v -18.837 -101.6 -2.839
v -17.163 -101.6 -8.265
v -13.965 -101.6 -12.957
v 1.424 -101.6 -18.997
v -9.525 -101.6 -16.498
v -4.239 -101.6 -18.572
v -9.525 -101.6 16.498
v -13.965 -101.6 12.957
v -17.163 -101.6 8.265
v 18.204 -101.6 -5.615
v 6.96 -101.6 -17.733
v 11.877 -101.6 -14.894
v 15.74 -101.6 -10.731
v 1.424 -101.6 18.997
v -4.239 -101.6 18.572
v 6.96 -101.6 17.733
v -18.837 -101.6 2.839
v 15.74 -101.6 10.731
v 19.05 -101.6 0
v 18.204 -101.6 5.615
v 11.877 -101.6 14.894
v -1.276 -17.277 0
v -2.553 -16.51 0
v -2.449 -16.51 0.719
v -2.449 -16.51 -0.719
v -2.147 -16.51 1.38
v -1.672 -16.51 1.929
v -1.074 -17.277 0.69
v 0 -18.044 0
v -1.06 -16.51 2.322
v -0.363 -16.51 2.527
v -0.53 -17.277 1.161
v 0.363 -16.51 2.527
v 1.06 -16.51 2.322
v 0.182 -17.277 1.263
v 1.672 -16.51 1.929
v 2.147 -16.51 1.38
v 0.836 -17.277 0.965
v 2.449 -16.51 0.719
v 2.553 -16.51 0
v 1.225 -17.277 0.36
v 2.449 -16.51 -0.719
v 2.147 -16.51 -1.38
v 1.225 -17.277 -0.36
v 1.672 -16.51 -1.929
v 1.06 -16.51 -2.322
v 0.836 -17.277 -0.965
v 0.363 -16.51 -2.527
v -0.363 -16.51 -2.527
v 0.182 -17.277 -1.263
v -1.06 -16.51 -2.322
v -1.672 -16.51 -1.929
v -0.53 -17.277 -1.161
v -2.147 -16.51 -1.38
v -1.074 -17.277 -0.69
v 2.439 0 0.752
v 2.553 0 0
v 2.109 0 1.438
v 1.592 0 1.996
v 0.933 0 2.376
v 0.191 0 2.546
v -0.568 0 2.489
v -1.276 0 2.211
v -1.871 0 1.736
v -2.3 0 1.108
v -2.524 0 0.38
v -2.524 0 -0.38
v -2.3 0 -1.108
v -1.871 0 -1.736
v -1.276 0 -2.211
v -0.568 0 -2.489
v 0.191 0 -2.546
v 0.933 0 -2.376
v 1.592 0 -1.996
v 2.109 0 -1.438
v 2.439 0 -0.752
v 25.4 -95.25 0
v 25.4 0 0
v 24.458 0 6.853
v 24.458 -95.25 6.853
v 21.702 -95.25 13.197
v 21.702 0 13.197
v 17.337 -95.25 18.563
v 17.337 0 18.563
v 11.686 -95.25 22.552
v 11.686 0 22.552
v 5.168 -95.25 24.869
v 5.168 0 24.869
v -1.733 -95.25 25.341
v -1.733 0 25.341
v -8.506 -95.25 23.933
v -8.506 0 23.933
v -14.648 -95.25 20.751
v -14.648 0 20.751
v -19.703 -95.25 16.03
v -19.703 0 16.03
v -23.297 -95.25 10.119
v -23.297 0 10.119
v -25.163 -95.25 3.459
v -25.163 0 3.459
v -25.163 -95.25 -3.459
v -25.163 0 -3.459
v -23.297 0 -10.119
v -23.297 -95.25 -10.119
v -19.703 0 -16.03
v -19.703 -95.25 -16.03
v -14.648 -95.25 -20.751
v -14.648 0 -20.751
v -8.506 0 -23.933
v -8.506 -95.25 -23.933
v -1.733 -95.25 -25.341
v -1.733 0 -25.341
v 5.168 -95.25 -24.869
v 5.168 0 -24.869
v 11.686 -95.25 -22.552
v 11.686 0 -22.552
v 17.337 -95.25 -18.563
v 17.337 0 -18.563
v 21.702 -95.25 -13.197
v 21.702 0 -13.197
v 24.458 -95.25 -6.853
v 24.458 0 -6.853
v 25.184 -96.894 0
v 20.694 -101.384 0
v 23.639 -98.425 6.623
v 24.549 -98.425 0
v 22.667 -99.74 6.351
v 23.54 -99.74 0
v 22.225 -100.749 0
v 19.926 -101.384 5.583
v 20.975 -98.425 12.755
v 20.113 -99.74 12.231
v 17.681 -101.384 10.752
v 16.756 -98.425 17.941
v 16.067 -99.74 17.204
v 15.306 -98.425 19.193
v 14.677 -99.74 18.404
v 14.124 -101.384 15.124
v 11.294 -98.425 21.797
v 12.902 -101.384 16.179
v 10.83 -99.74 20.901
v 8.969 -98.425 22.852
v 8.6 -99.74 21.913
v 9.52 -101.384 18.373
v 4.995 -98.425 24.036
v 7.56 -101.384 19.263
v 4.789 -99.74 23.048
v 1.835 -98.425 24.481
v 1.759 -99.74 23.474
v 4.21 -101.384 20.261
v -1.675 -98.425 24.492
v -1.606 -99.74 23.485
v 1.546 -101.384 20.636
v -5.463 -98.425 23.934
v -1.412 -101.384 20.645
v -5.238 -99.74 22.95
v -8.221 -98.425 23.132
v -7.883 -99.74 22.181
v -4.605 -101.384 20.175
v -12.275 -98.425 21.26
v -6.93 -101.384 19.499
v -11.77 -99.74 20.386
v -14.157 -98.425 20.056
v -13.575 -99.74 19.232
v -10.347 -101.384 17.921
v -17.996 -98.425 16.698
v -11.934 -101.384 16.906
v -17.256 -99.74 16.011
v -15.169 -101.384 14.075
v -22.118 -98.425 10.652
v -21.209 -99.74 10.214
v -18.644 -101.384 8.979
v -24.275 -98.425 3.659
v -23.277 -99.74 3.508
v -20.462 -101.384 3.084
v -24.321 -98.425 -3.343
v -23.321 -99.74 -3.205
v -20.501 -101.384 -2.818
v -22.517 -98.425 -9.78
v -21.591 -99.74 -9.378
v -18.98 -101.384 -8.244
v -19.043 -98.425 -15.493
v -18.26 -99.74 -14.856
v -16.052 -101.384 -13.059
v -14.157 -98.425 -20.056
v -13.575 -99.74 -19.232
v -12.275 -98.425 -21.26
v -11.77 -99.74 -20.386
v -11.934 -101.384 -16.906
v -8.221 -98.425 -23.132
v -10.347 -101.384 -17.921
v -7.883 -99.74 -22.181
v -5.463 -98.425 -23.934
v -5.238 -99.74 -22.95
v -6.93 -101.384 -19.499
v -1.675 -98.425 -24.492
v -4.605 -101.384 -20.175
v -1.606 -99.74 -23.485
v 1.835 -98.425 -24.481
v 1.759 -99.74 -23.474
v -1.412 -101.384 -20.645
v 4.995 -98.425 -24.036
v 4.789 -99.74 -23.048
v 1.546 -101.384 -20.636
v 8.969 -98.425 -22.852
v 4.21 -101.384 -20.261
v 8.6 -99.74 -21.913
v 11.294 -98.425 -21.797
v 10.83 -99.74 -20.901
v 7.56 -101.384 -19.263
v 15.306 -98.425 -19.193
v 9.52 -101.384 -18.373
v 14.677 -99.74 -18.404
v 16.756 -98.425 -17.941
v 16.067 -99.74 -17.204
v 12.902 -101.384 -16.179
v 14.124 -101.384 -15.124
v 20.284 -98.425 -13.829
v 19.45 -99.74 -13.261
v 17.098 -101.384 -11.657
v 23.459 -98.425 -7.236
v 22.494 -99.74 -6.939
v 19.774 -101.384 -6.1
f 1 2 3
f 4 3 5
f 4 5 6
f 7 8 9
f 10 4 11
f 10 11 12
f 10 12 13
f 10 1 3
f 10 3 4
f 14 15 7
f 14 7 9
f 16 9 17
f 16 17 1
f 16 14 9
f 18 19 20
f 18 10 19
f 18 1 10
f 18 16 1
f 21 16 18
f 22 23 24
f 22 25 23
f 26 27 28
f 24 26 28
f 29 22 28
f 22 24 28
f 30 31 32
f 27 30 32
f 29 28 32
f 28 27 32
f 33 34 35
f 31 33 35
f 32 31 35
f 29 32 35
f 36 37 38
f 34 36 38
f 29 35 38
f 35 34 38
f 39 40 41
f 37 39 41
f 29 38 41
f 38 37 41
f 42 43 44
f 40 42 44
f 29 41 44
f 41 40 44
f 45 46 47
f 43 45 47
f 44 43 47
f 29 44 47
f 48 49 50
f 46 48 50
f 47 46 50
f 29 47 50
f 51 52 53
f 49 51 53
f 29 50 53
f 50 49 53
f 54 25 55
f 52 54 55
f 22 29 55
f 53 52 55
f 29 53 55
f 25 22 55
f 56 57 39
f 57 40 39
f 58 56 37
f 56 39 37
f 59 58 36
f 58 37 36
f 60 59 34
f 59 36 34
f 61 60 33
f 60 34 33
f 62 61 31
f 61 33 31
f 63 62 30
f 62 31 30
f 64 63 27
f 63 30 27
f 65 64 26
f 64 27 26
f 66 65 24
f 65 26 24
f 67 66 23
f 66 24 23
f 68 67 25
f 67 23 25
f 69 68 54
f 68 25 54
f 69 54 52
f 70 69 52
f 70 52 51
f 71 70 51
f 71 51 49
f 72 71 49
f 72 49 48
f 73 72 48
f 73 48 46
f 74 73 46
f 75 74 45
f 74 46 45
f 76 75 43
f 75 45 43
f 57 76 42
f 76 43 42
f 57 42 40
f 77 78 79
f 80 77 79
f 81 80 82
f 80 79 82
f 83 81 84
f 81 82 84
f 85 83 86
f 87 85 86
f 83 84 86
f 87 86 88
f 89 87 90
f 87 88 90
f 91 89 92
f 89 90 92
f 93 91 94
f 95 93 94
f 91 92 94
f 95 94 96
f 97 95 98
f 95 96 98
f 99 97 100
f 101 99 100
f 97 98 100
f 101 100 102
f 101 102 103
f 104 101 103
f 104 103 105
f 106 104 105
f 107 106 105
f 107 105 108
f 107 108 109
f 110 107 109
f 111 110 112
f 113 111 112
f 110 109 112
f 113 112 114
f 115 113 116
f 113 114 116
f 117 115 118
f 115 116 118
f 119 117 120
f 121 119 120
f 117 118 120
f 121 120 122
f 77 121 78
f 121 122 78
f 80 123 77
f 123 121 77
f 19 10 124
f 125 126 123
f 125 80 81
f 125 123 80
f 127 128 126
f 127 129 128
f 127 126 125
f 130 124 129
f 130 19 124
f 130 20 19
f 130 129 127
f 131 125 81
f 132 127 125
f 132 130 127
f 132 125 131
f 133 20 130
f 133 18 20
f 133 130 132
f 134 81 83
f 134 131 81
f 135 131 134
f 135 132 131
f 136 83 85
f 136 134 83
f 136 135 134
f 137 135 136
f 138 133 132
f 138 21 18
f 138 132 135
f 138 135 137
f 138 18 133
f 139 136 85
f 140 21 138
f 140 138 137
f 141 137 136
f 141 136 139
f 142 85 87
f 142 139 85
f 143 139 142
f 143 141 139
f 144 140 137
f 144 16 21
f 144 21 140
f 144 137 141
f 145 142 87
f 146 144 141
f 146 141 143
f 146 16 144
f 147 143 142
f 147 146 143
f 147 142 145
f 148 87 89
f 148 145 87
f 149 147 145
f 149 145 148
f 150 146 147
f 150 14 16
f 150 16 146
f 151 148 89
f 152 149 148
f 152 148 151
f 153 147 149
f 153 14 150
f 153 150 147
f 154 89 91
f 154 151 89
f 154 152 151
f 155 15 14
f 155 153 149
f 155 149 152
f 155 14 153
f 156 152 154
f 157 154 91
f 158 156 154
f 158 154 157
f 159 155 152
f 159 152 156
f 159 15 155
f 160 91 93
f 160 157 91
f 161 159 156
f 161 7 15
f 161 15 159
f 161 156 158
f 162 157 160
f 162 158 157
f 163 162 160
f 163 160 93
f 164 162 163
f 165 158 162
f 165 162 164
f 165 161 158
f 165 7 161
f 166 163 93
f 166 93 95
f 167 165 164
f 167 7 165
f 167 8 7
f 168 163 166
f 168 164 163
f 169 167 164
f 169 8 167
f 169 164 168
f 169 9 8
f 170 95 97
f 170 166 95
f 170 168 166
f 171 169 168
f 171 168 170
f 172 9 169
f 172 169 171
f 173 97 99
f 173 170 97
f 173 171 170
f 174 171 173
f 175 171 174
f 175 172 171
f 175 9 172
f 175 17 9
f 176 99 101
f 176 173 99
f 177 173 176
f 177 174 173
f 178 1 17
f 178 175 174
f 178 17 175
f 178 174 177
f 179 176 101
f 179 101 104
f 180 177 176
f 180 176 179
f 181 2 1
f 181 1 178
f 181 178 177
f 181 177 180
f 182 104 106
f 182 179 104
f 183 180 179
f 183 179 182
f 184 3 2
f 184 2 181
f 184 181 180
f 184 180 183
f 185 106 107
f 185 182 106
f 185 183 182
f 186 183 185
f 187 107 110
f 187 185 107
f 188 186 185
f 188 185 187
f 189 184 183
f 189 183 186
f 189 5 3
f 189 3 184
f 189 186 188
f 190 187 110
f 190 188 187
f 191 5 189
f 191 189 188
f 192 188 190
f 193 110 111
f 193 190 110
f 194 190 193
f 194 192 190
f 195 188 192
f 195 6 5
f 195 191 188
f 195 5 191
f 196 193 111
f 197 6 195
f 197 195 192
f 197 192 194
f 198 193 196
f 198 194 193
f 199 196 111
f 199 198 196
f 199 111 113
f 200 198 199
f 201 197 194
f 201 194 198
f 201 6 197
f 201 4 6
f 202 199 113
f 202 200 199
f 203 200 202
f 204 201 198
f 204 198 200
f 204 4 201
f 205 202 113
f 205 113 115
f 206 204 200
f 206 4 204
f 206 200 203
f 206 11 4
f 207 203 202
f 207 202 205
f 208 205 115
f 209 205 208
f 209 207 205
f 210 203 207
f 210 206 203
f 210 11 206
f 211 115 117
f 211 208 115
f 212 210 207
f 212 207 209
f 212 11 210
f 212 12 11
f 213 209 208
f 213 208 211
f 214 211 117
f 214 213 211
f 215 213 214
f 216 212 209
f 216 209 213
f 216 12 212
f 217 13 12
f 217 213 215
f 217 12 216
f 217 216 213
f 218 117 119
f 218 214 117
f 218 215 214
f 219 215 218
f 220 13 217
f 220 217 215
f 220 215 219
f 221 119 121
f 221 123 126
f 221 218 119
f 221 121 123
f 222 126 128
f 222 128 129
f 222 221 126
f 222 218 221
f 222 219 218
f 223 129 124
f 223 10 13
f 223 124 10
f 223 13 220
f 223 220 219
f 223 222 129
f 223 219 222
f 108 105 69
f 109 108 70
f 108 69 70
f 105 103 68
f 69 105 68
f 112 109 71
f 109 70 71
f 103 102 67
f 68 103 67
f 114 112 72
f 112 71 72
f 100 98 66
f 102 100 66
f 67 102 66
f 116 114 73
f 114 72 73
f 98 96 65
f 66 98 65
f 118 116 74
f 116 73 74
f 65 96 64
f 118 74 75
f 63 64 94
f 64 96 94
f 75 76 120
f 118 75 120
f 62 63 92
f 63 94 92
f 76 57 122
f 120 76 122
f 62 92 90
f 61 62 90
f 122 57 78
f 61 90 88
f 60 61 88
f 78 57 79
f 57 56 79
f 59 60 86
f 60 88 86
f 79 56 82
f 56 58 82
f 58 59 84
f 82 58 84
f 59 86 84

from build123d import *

# Parameters (mm, degrees)
F0_R     = 25.4
F1_DEPTH = 101.6
F2_R     = 6.35
F4_D     = 5.1054
F4_DEPTH = 16.51
F4_TIP   = 1.5338169022


with BuildPart() as f1:
    # F0 (on Front) → F1 (new body)
    with BuildSketch(Plane.XZ):
        Circle(F0_R)
    extrude(amount=F1_DEPTH)

    # F2
    f2_edges = [f1.edges().sort_by_distance(p)[0] for p in [
        (-25.4, -101.6, 0),
    ]]
    fillet(f2_edges, radius=F2_R)

    # F4
    with Locations(Plane(origin=(0, 0, 0), x_dir=(-1, 0, 0), z_dir=(0, 1, 0))):
        with Locations((0, 0)):
            Hole(F4_D / 2, depth=F4_DEPTH)
            with Locations((0, 0, -(F4_DEPTH + F4_TIP / 2))):  # 118° drill point
                Cone(0, F4_D / 2, F4_TIP, mode=Mode.SUBTRACT)


solid = f1.part
